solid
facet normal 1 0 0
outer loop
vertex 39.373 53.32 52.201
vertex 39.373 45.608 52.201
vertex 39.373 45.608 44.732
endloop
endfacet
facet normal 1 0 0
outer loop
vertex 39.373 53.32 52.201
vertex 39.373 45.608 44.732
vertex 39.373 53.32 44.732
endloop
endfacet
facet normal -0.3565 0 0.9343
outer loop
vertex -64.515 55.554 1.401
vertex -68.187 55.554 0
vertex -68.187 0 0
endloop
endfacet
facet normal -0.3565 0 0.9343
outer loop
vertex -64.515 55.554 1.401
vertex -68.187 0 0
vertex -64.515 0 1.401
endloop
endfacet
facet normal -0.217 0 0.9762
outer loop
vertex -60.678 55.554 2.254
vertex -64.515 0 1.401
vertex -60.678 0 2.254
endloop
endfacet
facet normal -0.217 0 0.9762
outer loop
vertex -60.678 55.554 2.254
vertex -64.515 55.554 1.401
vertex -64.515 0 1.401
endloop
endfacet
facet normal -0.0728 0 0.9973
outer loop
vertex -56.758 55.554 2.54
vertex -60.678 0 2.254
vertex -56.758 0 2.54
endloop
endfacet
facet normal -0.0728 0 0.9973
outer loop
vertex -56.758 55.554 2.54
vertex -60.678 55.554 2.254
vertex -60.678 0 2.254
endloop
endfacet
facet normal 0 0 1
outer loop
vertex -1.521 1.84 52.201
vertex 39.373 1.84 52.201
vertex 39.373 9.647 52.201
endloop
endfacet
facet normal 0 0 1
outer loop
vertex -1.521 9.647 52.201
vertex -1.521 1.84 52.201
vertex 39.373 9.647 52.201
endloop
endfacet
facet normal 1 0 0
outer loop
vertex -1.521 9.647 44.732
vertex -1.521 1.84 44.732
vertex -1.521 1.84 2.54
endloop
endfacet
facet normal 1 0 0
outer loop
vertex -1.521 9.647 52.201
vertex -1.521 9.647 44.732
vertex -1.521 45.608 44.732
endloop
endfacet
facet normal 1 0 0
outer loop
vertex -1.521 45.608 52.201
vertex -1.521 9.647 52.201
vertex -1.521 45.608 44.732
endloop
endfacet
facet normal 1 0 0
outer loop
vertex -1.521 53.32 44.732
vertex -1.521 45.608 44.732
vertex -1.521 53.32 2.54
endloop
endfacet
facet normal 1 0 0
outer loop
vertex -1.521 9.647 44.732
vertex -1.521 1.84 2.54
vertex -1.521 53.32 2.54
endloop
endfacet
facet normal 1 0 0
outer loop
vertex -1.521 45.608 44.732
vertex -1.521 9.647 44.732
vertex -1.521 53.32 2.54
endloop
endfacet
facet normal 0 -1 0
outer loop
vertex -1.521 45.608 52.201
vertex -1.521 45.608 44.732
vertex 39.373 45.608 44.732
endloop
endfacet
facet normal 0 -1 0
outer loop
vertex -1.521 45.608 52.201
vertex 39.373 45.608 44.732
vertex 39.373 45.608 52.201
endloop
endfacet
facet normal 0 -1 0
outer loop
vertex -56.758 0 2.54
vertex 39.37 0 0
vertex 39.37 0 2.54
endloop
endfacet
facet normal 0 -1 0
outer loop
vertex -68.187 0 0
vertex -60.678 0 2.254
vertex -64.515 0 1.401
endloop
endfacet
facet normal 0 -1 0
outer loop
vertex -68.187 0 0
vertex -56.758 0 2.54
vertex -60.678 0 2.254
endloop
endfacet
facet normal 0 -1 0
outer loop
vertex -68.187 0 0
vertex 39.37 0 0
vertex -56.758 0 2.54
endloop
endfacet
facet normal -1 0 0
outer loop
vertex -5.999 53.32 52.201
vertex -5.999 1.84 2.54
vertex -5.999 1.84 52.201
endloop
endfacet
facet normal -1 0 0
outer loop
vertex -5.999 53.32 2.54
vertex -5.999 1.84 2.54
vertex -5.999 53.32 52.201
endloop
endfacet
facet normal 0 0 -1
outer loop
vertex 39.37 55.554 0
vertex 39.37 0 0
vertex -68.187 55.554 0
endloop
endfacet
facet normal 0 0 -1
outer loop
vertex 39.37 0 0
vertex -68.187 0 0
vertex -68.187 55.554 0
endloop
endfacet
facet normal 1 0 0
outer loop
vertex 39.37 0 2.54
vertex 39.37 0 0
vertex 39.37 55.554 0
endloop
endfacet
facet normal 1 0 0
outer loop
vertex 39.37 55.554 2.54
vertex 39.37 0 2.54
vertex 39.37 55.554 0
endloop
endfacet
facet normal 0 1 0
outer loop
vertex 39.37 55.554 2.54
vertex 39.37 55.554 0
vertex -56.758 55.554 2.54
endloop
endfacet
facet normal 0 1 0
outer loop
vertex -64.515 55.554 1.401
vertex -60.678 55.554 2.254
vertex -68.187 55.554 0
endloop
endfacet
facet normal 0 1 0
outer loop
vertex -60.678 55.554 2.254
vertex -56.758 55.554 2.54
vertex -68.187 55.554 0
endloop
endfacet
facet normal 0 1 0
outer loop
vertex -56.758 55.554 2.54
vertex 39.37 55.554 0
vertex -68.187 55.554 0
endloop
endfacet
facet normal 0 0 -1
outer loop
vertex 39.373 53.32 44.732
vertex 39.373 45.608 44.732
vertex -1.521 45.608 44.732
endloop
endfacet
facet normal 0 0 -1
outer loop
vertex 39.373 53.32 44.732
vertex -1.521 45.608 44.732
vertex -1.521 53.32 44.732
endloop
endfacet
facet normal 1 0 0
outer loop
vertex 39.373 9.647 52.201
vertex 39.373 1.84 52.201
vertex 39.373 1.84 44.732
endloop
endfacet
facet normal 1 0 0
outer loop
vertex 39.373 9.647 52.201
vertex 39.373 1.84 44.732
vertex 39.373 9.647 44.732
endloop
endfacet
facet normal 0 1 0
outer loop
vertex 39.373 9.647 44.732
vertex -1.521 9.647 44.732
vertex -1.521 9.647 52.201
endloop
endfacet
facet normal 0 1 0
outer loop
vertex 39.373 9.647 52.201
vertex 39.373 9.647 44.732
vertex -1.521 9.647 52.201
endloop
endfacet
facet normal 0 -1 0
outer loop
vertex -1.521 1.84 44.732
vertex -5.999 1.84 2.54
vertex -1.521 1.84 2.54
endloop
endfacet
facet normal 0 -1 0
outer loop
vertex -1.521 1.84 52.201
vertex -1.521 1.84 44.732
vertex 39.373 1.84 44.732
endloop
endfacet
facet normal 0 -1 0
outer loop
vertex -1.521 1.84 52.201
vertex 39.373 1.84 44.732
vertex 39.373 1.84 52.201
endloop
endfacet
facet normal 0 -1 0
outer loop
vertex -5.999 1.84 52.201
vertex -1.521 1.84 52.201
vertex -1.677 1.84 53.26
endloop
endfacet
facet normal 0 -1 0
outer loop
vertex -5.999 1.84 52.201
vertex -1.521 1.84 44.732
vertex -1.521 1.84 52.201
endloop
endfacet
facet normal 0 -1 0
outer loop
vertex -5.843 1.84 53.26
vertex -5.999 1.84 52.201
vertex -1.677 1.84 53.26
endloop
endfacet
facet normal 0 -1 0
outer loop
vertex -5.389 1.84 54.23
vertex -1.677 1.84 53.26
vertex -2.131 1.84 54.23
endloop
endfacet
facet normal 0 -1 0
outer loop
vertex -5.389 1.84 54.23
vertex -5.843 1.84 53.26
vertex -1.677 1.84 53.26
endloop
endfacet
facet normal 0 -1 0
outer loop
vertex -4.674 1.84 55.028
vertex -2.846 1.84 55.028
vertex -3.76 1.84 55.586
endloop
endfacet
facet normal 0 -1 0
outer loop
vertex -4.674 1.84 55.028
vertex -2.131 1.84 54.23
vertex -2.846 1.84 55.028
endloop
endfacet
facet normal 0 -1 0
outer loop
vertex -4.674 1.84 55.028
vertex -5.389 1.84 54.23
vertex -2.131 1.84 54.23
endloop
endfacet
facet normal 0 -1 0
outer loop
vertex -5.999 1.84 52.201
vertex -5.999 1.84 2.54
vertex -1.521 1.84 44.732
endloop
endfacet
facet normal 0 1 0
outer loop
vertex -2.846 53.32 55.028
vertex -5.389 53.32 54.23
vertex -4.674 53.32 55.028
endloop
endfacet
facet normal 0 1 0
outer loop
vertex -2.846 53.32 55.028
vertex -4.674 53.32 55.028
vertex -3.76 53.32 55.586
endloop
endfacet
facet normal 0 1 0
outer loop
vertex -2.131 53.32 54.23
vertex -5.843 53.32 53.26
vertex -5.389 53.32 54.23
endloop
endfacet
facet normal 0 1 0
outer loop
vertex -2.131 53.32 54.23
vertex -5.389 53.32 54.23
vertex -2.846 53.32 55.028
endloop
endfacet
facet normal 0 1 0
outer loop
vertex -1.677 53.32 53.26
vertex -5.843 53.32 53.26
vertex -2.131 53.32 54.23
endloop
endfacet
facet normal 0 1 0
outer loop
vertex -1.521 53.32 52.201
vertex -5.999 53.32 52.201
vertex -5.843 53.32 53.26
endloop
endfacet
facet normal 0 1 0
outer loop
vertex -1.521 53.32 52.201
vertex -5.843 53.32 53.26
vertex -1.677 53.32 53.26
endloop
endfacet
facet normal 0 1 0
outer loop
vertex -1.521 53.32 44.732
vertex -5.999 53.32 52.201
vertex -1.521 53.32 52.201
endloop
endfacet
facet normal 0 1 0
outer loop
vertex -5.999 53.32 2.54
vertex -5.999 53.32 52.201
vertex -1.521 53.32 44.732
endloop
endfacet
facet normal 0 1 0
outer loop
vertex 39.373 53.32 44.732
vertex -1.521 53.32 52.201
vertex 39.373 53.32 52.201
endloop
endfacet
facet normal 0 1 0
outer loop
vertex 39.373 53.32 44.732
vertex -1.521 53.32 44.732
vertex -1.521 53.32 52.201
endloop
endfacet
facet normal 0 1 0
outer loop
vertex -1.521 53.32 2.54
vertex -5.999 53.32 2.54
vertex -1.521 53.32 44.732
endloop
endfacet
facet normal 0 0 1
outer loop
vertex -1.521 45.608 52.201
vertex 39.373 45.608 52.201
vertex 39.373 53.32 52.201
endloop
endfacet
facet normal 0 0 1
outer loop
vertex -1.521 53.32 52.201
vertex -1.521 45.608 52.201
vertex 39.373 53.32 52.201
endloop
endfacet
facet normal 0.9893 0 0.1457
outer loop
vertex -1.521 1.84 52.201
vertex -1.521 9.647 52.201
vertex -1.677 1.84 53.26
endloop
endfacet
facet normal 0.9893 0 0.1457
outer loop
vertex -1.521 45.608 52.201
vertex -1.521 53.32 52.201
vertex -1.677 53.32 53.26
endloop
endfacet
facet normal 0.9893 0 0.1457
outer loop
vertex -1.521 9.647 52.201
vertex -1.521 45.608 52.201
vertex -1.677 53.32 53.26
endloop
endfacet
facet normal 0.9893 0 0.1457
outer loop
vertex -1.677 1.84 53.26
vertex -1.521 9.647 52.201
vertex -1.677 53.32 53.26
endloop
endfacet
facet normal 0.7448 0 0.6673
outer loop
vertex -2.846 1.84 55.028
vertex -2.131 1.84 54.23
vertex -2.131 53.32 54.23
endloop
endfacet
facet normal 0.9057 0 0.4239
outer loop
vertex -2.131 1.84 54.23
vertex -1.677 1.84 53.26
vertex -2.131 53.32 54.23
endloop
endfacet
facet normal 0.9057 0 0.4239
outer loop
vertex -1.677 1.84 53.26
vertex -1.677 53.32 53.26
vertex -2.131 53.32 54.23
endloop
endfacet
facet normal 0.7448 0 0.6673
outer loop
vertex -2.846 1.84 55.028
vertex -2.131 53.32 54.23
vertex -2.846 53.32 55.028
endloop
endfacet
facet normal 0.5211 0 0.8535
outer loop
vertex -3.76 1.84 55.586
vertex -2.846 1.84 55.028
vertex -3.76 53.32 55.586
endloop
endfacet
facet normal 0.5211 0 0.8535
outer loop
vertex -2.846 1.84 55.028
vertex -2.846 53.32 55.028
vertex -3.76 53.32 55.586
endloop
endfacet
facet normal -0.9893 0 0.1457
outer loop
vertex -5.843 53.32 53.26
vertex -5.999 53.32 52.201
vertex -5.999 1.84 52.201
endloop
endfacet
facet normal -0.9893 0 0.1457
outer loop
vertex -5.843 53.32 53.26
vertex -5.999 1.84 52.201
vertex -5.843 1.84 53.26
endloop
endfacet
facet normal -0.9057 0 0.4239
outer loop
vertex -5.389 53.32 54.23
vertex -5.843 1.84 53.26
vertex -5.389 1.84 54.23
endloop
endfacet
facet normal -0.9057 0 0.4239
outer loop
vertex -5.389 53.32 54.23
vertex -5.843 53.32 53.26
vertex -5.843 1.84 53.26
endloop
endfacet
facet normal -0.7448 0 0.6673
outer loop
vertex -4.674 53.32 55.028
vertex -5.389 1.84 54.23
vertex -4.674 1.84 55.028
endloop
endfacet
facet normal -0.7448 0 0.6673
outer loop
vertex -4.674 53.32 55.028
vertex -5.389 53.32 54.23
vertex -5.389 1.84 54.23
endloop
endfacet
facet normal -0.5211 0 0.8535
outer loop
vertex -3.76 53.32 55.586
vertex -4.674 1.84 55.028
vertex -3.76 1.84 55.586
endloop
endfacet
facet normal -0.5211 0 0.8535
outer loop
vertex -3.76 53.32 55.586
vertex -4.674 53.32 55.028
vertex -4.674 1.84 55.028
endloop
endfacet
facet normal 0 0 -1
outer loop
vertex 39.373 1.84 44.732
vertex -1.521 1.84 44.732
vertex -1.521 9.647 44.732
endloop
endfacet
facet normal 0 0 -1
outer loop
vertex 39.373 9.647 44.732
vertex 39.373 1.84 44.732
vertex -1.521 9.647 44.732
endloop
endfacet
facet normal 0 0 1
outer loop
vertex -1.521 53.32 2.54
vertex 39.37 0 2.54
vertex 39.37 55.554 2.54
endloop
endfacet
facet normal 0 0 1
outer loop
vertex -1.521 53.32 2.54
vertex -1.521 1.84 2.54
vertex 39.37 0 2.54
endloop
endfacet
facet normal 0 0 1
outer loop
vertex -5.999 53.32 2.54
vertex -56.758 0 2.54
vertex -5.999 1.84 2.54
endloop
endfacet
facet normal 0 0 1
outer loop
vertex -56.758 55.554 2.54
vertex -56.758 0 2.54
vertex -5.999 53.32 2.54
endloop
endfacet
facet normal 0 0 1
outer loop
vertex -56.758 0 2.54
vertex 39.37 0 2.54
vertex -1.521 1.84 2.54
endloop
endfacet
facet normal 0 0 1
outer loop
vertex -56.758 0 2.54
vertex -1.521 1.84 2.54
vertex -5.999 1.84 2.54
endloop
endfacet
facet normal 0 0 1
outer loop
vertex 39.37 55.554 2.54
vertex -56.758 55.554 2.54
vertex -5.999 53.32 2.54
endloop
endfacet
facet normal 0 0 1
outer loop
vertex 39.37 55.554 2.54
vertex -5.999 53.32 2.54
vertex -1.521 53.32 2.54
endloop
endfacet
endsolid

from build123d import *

# Parameters (mm, degrees)
F0_W        = 68.1868493557
F0_H        = 55.5541068316
F1_DEPTH    = 2.54
F2_T1_DEPTH = 112.6971628242
F3_W        = 4.4784088386
F3_H        = 51.4798170188
F4_DEPTH    = 53.34
F5_T1_DEPTH = 69.8761243641
F6_W        = 7.8073056648
F6_H        = 7.4690097984
F6_W_2      = 7.7111199498
F7_DEPTH    = 40.894
F8_DEPTH    = 39.37


# Not quite as in the source:
# - a fillet or chamfer that OpenCascade refuses, or shapes differently, is made with other operations: its cross-section is extruded or revolved along the edge and cut away or added


with BuildPart() as f1:
    # F0 (on Top) → F1 (new body)
    with BuildSketch(Plane.XY):
        with Locations((-34.0934246778, 27.7770534158)):
            Rectangle(F0_W, F0_H)
    extrude(amount=F1_DEPTH)

    # F2: fillet of radius 26.9812507731 on 1 edges, made by hand

    # F2_s2 → F2_t1 (cut)
    with BuildSketch(Plane.XZ.offset(-84.1256348279)):
        with BuildLine():
            ThreePointArc((-68.1868493557, 0), (-62.6119710245, 1.8973464712), (-56.7582381572, 2.54))
            Line((-56.7582381572, 2.54), (-68.1868493557, 2.54))
            Line((-68.1868493557, 2.54), (-68.1868493557, 0))
        make_face()
    extrude(amount=F2_T1_DEPTH, mode=Mode.SUBTRACT)

    # F3 (on face) → F4 (join)
    with BuildSketch(Plane.XY.offset(2.54)):
        with Locations((-3.760119027, 27.5797095965)):
            Rectangle(F3_W, F3_H)
    extrude(amount=F4_DEPTH)

    # F5: fillet of radius 3.6792614691 on 2 edges, made by hand

    # F5_s2 → F5_t1 (cut)
    with BuildSketch(Plane.XZ.offset(-62.5177717785)):
        with BuildLine():
            ThreePointArc((-1.5209146077, 52.2007385309), (-2.5985453422, 54.8023692655), (-5.2001760767, 55.88))
            Line((-5.2001760767, 55.88), (-1.5209146077, 55.88))
            Line((-1.5209146077, 55.88), (-1.5209146077, 52.2007385309))
        make_face()
        with BuildLine():
            ThreePointArc((-5.9993234463, 52.2007385309), (-4.9216927118, 54.8023692655), (-2.3200619772, 55.88))
            Line((-2.3200619772, 55.88), (-5.9993234463, 55.88))
            Line((-5.9993234463, 55.88), (-5.9993234463, 52.2007385309))
        make_face()
    extrude(amount=F5_T1_DEPTH, mode=Mode.SUBTRACT)

    # F6 (on face) → F7 (join)
    with BuildSketch(Plane.YZ.offset(-1.5209146077)):
        with Locations((5.7434539194, 48.4662336318)):
            Rectangle(F6_W, F6_H)
        with Locations((49.464058131, 48.4662336318)):
            Rectangle(F6_W_2, F6_H)
    extrude(amount=F7_DEPTH)

    # F8 (add): a face of the model
    f8_faces = [f1.faces().sort_by_distance(p)[0] for p in [
        (0, 27.7770534158, 1.27),
    ]]
    extrude(f8_faces, amount=F8_DEPTH)


solid = f1.part
